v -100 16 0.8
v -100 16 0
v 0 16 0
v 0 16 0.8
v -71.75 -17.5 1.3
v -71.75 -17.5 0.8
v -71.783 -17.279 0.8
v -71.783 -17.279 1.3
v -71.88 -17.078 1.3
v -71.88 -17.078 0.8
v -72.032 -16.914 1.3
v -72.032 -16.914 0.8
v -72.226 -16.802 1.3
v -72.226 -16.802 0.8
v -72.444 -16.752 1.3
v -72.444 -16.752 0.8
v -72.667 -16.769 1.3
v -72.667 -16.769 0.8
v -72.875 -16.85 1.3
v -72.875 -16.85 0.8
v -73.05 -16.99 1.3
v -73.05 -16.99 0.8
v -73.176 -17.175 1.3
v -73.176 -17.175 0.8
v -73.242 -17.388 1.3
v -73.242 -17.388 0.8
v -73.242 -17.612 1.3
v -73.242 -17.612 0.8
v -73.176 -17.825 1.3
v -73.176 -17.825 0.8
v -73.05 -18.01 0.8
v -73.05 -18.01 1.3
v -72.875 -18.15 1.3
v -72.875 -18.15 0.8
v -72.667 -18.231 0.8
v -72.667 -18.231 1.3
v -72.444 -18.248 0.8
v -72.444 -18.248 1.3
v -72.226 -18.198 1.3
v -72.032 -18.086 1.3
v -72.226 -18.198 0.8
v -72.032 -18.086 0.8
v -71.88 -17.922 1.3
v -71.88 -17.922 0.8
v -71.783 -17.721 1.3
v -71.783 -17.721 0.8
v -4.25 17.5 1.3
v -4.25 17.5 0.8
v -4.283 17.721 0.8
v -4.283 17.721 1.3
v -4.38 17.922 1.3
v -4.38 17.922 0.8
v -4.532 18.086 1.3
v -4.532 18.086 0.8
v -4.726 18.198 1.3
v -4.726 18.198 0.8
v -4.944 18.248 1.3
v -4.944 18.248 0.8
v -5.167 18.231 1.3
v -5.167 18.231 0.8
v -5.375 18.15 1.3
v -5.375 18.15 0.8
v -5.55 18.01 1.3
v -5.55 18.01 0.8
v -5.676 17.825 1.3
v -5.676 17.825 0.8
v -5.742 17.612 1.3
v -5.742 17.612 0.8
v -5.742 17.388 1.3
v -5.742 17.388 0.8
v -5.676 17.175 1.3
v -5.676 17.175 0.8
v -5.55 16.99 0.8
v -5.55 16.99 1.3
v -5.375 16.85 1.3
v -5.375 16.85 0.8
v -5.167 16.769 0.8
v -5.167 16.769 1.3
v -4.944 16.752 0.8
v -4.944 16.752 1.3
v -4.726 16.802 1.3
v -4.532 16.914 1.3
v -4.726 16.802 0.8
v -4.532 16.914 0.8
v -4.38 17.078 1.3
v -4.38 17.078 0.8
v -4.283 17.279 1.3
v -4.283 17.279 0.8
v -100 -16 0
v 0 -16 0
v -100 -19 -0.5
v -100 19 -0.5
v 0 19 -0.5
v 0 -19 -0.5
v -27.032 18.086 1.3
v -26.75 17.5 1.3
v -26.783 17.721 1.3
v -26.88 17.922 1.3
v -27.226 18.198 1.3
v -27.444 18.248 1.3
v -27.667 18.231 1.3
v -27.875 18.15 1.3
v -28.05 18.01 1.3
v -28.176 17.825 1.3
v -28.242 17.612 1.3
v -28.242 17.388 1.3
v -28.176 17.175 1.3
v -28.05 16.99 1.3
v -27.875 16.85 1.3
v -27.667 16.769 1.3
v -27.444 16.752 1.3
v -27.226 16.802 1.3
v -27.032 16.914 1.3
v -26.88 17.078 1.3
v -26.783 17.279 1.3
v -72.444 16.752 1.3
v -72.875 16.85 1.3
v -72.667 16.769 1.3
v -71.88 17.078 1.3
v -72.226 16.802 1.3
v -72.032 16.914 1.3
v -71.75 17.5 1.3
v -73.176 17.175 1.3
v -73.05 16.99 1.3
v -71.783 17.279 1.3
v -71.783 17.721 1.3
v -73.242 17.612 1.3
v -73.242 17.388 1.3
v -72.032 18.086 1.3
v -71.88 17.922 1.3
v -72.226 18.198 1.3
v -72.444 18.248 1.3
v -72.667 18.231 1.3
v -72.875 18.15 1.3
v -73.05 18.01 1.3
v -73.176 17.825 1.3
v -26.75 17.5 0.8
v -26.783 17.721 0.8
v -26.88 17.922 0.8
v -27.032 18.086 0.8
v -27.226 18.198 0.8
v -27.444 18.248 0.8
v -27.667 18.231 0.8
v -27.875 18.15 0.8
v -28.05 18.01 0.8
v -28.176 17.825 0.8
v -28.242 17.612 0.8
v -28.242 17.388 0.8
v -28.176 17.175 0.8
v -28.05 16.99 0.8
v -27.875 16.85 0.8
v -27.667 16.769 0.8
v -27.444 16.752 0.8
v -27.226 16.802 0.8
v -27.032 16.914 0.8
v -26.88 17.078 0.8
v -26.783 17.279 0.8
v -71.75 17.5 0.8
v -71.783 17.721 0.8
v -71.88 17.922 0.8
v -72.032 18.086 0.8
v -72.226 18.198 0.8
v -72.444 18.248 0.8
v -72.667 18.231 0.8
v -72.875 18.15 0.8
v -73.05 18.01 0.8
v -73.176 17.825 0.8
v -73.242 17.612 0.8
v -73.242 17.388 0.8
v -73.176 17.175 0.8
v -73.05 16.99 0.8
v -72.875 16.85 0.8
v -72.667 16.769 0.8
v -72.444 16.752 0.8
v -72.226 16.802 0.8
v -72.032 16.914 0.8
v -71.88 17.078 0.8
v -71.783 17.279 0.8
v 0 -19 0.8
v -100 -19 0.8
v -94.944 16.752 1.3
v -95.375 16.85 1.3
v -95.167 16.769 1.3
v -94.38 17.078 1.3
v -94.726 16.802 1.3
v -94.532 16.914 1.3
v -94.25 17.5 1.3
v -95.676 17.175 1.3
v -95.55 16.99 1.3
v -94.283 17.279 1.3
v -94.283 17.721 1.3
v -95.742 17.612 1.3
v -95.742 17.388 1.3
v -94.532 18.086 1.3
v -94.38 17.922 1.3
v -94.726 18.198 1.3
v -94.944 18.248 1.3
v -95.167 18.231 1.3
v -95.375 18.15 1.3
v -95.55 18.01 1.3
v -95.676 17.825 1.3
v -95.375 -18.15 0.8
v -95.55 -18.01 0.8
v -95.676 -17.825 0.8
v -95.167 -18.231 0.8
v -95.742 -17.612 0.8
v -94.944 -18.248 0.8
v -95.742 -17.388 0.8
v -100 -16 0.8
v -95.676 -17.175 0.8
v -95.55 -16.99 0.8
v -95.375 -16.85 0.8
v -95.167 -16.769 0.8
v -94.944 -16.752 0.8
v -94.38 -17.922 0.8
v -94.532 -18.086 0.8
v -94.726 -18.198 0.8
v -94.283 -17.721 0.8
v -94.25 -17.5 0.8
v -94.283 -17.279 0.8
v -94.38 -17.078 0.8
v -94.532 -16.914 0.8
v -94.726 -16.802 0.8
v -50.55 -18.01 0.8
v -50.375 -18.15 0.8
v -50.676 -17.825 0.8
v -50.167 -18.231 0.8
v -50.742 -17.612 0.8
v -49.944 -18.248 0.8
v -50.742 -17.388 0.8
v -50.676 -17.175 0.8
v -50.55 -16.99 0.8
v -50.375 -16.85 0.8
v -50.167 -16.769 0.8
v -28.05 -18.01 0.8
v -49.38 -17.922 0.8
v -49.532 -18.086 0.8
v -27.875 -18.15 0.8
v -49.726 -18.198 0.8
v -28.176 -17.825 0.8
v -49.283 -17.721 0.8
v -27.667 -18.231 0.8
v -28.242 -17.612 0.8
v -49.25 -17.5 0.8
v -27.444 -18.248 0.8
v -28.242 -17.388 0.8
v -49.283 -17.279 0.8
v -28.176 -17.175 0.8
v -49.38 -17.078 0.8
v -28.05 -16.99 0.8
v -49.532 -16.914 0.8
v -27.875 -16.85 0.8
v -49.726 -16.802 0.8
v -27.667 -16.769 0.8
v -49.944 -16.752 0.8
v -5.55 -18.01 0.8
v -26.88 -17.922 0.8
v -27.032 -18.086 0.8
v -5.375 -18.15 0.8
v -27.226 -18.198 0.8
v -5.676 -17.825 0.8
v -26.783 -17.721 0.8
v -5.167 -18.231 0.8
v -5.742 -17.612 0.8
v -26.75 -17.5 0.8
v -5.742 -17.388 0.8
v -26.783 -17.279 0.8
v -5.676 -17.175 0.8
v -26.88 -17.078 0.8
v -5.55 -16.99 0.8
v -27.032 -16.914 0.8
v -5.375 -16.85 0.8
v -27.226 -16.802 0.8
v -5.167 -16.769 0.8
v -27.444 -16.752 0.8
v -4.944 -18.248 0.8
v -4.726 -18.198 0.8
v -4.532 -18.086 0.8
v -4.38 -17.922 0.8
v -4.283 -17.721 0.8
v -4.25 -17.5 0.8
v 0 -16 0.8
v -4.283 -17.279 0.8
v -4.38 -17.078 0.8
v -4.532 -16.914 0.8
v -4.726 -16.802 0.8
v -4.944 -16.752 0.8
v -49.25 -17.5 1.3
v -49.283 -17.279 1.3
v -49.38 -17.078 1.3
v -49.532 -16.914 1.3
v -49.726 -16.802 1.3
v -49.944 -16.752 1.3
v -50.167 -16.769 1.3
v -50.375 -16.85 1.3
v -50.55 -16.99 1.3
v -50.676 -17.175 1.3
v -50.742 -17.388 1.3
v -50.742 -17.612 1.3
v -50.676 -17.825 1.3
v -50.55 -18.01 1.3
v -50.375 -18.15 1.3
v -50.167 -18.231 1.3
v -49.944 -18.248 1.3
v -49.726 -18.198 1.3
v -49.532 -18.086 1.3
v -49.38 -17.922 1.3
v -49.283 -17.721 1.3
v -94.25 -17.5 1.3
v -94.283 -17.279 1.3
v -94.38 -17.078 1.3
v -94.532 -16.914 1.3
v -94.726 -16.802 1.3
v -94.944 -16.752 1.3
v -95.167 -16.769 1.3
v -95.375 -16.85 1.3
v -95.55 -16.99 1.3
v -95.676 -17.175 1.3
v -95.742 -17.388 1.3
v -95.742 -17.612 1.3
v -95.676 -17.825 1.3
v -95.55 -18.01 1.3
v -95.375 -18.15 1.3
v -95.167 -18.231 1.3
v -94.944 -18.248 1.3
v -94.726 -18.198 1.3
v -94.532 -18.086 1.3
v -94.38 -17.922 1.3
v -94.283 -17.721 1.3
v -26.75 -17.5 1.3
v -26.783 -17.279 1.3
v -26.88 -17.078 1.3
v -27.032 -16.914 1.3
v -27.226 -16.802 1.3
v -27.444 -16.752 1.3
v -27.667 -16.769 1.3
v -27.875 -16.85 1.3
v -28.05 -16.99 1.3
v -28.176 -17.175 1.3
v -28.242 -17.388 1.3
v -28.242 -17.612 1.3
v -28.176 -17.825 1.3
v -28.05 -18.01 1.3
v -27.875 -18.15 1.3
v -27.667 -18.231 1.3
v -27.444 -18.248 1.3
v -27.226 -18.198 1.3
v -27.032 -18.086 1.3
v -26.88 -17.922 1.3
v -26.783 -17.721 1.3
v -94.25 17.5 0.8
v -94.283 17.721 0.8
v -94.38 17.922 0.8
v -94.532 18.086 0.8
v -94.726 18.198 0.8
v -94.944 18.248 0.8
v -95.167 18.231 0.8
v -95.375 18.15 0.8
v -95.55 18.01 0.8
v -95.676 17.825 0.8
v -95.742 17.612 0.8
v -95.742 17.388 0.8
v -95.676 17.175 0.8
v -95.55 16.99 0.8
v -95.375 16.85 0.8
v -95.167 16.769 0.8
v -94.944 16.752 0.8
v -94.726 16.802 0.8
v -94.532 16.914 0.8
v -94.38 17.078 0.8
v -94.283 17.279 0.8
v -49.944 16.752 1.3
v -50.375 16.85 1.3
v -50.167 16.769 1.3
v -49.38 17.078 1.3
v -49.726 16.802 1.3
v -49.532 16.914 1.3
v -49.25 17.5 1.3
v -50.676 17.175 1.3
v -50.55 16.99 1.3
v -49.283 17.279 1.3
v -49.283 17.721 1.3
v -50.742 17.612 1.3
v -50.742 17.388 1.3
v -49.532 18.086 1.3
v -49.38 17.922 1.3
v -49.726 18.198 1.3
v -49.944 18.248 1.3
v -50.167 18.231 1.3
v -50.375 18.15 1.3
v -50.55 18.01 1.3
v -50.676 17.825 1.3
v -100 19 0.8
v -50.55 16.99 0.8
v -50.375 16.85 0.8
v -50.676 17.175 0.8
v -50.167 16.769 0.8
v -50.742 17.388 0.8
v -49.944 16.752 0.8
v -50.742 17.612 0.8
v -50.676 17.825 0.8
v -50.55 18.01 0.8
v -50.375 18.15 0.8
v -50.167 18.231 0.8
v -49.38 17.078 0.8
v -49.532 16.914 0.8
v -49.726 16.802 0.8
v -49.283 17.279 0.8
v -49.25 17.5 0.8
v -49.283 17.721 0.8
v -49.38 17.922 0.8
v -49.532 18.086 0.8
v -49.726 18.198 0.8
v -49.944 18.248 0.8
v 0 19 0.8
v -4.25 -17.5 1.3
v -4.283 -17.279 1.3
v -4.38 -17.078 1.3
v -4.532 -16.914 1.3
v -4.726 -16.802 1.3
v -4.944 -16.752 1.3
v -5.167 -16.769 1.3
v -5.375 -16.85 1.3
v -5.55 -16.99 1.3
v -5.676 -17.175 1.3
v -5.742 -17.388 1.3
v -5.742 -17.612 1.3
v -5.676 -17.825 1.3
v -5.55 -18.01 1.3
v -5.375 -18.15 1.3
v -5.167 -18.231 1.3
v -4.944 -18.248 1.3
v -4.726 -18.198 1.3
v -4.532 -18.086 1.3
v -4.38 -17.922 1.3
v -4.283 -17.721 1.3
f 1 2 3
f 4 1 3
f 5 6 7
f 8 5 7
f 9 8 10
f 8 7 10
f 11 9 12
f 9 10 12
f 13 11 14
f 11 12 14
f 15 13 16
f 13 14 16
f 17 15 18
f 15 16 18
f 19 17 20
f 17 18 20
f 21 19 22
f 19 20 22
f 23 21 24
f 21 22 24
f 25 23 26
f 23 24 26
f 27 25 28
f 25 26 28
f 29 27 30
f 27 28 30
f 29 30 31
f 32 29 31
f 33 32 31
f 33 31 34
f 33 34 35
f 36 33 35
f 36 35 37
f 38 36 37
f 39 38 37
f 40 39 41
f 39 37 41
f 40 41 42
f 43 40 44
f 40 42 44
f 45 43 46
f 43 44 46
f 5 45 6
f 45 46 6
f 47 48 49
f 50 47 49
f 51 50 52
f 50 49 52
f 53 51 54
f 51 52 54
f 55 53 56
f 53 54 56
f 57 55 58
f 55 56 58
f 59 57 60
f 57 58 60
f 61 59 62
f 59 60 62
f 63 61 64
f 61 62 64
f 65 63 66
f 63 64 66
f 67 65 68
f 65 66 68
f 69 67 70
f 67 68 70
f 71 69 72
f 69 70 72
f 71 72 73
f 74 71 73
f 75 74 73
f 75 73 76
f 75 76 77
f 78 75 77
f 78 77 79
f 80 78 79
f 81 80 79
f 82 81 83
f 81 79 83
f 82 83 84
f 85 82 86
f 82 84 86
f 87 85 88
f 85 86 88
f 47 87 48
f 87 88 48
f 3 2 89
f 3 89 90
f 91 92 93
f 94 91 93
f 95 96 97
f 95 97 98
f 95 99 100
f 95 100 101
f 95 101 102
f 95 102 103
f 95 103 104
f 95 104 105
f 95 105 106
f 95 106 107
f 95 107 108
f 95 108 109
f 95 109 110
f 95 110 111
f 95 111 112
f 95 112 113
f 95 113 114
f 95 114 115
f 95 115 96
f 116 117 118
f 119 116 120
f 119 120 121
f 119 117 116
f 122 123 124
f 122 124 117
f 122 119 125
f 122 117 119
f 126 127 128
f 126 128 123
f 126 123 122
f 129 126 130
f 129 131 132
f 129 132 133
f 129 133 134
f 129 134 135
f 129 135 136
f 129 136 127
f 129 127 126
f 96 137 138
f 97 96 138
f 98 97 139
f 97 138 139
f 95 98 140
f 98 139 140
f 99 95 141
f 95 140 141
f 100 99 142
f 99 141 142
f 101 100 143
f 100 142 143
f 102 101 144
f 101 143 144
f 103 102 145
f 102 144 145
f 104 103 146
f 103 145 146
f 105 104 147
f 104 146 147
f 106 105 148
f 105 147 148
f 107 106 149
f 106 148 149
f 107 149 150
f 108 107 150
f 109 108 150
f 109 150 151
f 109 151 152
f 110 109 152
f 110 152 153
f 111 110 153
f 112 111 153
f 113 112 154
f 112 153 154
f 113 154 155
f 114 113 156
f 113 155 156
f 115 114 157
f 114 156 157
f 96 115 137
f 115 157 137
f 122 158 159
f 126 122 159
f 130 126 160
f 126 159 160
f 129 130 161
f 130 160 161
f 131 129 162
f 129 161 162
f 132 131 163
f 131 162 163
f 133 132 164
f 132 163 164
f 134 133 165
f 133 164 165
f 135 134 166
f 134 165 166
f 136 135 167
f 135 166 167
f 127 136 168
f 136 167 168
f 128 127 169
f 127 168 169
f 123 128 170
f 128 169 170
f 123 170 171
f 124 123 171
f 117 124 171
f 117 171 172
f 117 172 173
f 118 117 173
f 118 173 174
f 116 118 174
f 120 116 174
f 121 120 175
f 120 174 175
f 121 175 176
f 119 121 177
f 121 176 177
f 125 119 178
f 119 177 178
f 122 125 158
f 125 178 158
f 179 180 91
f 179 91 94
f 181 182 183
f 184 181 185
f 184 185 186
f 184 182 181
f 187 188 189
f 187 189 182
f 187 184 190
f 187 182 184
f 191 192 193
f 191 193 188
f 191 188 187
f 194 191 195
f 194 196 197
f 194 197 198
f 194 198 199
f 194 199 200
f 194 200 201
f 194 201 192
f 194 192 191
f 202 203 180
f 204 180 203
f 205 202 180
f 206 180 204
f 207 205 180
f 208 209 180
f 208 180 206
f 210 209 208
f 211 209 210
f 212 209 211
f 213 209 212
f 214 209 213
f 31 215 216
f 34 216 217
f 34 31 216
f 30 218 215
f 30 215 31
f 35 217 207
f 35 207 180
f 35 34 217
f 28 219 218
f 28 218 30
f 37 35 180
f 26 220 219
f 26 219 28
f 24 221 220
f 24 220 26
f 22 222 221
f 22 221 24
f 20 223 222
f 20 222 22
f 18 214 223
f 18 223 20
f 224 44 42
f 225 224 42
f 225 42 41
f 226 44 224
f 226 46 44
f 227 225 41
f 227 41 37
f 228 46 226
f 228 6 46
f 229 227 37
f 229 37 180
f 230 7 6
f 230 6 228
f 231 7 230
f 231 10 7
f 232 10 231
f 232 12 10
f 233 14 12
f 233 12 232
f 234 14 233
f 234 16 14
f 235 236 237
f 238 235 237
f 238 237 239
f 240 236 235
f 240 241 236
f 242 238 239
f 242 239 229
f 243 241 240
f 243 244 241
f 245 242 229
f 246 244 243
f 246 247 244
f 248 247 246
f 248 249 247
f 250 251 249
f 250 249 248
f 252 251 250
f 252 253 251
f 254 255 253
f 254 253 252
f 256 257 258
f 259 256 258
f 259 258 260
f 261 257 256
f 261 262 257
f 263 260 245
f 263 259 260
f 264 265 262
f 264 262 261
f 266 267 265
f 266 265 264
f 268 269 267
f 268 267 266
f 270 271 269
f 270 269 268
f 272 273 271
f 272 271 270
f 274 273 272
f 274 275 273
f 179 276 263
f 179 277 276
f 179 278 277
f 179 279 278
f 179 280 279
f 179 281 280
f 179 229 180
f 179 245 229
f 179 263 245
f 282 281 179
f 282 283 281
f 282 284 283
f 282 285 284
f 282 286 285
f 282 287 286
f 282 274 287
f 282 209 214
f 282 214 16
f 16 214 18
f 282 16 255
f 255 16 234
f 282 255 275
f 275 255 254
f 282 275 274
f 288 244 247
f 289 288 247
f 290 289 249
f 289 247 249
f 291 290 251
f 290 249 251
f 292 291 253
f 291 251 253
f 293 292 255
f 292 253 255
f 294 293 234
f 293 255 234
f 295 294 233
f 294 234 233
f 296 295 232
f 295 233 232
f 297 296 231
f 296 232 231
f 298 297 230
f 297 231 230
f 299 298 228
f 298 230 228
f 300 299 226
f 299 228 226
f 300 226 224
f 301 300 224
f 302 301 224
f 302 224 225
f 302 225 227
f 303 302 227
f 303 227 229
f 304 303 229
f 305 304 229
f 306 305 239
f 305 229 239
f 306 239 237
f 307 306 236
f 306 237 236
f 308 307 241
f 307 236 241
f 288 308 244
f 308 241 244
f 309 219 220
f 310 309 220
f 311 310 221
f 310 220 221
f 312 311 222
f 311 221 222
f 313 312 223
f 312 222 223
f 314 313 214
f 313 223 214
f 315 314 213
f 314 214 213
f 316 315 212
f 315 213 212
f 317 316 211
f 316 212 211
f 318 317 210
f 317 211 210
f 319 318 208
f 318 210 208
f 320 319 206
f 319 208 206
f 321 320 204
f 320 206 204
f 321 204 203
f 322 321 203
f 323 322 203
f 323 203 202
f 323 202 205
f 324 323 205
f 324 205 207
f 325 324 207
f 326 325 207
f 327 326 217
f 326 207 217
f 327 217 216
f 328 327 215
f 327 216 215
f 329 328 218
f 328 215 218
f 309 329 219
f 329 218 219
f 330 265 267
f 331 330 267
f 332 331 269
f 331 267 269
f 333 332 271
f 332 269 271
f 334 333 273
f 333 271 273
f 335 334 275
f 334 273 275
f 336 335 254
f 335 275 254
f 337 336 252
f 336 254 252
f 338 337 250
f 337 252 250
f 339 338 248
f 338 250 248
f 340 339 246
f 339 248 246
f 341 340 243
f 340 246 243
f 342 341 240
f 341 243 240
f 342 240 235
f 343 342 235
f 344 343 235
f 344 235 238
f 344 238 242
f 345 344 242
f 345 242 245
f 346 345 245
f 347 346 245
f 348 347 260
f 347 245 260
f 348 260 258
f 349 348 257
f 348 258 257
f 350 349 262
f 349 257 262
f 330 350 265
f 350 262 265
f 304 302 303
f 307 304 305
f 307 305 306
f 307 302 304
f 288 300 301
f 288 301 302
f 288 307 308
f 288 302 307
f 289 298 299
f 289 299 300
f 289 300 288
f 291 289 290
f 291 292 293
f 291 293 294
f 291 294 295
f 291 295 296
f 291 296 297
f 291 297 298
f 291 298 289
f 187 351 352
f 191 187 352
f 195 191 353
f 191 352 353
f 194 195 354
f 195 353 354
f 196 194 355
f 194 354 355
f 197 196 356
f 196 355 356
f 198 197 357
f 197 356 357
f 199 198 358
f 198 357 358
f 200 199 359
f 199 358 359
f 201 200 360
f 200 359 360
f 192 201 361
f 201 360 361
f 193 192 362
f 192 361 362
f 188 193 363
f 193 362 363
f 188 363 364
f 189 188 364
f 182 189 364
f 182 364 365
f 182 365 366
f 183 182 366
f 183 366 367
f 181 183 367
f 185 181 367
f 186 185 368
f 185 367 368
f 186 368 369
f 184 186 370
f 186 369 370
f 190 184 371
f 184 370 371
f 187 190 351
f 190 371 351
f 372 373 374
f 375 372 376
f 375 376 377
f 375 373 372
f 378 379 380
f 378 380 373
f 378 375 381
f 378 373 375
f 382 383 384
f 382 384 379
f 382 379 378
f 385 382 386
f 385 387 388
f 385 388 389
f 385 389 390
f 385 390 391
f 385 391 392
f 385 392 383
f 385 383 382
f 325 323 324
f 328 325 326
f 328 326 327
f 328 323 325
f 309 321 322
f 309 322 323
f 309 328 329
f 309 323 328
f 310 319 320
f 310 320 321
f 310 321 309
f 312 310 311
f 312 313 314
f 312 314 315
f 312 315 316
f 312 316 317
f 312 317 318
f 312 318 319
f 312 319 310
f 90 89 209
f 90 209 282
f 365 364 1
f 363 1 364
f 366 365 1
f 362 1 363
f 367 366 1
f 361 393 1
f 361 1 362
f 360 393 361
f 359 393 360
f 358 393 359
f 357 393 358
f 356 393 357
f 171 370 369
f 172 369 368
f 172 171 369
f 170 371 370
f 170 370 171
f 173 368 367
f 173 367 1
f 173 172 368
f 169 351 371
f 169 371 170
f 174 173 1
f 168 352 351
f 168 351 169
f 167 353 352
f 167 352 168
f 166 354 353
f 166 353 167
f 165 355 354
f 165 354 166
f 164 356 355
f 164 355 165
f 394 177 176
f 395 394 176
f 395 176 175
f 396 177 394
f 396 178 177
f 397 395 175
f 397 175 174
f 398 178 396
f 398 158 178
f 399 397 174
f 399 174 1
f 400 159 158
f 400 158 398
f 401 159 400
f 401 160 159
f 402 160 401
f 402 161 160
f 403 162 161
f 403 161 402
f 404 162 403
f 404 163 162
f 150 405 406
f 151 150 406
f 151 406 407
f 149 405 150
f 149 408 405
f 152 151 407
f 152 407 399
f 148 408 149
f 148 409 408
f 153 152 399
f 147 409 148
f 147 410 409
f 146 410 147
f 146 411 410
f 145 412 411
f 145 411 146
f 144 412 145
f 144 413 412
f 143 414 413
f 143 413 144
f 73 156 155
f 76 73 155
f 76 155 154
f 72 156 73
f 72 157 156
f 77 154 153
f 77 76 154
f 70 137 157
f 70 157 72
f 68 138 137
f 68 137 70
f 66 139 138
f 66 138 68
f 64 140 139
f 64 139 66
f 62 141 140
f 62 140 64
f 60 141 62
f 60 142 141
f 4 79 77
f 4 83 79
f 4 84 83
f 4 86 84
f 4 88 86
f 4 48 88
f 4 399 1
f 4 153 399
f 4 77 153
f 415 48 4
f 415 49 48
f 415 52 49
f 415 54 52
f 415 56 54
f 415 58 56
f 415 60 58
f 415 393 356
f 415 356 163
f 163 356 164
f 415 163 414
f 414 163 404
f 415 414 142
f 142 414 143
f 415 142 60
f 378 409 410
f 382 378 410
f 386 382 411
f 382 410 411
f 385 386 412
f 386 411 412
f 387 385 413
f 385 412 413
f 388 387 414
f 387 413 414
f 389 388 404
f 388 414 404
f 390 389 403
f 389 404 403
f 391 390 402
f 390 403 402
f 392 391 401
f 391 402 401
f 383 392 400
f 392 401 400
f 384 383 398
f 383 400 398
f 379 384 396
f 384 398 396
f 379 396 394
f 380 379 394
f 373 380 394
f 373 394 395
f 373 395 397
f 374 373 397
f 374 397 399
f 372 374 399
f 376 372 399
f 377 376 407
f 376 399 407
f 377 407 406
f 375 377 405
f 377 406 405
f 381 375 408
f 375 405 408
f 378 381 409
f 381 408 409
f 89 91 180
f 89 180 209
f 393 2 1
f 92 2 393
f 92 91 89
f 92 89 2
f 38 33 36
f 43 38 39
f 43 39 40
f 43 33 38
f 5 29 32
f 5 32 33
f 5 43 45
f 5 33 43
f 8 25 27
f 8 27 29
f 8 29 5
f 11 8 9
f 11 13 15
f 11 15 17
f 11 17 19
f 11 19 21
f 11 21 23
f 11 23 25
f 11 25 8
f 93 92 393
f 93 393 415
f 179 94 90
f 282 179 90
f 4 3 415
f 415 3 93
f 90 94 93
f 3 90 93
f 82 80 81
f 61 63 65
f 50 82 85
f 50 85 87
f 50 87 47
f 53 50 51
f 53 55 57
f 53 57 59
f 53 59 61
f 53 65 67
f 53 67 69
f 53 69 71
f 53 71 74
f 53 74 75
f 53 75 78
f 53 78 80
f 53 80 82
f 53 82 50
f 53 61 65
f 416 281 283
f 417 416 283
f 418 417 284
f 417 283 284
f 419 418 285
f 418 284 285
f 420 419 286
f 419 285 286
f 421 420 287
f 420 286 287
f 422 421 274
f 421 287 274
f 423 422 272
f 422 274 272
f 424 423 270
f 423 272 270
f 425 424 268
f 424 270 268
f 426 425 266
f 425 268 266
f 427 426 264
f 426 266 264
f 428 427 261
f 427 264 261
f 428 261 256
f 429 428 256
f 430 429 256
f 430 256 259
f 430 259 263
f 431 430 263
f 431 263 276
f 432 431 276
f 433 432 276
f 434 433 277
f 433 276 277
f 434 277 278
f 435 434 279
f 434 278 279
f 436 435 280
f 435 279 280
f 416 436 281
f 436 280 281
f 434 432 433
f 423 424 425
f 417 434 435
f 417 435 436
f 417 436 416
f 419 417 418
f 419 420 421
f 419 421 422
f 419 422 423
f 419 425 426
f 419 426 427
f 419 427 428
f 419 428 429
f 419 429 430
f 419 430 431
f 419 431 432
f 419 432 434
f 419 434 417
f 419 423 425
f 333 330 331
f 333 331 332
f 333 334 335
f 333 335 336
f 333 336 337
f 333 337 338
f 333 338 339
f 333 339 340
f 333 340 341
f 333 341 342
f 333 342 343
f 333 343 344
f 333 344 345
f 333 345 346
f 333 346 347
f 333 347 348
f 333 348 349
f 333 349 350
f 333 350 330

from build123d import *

# Parameters (mm, degrees)
F0_W     = 100
F0_H     = 38
F1_DEPTH = 0.5
F2_W     = 100
F2_H     = 3
F3_DEPTH = 0.8
F4_R     = 0.75
F5_DEPTH = 0.5
F6_R     = 0.75
F7_DEPTH = 0.5


# Not quite as in the source:
# - a feature names something its author has since deleted; it is built from what else it names


with BuildPart() as f1:
    # F0 (on Top) → F1 (new body)
    with BuildSketch(Plane.XY):
        with Locations((-50, 0)):
            Rectangle(F0_W, F0_H)
    extrude(amount=-F1_DEPTH)

    # F2 (on face) → F3 (join)
    with BuildSketch(Plane.XY):
        with Locations((-50, 17.5)):
            Rectangle(F2_W, F2_H)
        with Locations((-50, -17.5)):
            Rectangle(F2_W, F2_H)
    extrude(amount=F3_DEPTH)

    # F4 (on face) → F5 (join)
    with BuildSketch(Plane.XY.offset(0.8)):
        with Locations((-95, 17.5)):
            Circle(F4_R)
        with Locations((-72.5, 17.5)):
            Circle(F4_R)
        with Locations((-50, 17.5)):
            Circle(F4_R)
        with Locations((-27.5, 17.5)):
            Circle(F4_R)
        with Locations((-5, 17.5)):
            Circle(F4_R)
    extrude(amount=F5_DEPTH)

    # F6 (on face) → F7 (join)
    with BuildSketch(Plane.XY.offset(0.8)):
        with Locations((-95, -17.5)):
            Circle(F6_R)
        with Locations((-72.5, -17.5)):
            Circle(F6_R)
        with Locations((-50, -17.5)):
            Circle(F6_R)
        with Locations((-27.5, -17.5)):
            Circle(F6_R)
        with Locations((-5, -17.5)):
            Circle(F6_R)
    extrude(amount=F7_DEPTH)


solid = f1.part
